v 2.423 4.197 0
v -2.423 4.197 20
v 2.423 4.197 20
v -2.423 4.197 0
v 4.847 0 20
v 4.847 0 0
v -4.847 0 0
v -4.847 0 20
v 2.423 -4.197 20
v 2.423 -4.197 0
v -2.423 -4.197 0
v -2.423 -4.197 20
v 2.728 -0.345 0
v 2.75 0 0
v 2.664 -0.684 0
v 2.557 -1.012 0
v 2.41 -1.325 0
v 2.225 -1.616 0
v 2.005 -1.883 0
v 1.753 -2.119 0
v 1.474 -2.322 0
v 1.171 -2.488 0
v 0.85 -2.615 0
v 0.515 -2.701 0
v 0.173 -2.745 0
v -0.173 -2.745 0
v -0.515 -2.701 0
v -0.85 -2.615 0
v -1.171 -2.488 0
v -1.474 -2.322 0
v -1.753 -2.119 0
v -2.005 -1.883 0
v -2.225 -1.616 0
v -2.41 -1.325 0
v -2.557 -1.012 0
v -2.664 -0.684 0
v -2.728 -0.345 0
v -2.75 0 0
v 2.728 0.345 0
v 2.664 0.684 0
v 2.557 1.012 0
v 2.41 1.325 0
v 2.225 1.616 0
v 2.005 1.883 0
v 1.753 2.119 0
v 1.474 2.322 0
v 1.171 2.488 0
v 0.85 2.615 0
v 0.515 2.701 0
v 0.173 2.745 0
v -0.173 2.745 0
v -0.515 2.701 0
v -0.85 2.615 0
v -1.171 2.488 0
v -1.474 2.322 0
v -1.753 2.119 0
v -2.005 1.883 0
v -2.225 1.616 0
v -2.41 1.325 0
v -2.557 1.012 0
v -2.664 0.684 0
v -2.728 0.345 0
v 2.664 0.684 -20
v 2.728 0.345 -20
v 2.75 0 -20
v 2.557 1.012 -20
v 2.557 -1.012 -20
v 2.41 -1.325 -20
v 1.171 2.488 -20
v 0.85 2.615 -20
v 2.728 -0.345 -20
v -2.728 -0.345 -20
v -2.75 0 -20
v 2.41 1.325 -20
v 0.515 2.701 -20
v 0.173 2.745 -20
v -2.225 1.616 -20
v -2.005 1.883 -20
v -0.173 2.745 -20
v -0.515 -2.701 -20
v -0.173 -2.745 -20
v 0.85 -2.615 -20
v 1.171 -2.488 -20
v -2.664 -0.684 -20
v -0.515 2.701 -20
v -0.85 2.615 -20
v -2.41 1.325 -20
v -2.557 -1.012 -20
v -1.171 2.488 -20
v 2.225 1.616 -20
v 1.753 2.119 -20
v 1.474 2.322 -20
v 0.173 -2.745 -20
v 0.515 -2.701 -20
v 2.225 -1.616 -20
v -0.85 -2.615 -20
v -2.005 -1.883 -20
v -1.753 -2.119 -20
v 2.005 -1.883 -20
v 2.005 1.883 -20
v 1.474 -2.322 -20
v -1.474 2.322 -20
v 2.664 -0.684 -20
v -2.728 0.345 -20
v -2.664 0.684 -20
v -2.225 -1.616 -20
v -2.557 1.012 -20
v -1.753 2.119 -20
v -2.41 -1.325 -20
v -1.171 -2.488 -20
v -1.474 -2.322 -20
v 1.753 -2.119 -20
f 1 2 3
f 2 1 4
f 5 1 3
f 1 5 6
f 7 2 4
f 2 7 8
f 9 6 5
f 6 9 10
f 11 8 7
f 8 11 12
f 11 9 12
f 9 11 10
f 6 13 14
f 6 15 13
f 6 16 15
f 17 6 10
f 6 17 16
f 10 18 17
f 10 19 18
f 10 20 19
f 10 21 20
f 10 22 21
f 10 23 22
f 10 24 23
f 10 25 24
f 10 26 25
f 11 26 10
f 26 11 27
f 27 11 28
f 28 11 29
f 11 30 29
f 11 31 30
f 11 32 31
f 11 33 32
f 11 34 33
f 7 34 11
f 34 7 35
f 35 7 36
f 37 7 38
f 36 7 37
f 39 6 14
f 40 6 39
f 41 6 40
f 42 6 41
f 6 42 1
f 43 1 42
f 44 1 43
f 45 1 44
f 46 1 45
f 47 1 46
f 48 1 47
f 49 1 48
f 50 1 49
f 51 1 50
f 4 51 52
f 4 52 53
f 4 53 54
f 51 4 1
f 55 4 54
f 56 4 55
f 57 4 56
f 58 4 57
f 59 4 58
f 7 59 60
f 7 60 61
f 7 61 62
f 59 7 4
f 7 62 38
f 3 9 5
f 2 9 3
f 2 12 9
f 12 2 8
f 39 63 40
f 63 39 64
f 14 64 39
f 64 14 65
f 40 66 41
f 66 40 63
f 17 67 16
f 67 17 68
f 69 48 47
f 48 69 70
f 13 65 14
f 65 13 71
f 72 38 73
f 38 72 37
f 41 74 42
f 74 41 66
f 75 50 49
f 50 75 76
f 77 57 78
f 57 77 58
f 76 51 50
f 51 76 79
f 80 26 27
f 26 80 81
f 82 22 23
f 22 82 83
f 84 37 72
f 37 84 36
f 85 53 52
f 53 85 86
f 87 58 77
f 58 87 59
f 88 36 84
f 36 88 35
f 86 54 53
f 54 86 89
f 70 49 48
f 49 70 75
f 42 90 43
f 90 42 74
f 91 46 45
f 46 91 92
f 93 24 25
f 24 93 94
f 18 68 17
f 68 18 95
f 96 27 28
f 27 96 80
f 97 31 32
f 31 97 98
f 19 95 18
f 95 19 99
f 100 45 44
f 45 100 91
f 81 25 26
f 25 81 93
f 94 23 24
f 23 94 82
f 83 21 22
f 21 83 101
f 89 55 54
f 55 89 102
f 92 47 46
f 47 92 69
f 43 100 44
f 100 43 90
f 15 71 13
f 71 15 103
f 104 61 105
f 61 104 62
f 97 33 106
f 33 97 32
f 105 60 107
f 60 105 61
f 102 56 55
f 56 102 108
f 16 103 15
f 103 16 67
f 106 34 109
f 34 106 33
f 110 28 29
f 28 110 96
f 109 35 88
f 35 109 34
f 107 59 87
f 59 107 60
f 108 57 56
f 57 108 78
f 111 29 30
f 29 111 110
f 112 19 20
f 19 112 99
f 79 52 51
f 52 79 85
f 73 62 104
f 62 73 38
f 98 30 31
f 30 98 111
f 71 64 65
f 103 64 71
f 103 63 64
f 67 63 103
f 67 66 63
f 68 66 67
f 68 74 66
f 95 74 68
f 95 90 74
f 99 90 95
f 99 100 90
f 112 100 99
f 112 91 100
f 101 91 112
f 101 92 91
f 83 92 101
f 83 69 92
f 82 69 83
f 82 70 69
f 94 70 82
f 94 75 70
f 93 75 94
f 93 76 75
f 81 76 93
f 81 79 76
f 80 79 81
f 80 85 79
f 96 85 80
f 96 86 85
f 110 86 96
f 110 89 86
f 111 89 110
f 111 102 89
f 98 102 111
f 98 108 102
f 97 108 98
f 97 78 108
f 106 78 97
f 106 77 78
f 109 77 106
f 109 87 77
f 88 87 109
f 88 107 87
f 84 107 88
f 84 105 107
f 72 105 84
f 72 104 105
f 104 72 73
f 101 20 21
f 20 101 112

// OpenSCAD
$fn = 50;


difference() {
	union() {
		linear_extrude(height = 20) {
			polygon(points = [[4.8468000000, 0.0000000000], [2.4234000000, 4.1974519271], [-2.4234000000, 4.1974519271], [-4.8468000000, 0.0000000000], [-2.4234000000, -4.1974519271], [2.4234000000, -4.1974519271]]);
		}
		translate(v = [0, 0, -20]) {
			cylinder(h = 20, r = 2.7500000000);
		}
	}
	union();
}
